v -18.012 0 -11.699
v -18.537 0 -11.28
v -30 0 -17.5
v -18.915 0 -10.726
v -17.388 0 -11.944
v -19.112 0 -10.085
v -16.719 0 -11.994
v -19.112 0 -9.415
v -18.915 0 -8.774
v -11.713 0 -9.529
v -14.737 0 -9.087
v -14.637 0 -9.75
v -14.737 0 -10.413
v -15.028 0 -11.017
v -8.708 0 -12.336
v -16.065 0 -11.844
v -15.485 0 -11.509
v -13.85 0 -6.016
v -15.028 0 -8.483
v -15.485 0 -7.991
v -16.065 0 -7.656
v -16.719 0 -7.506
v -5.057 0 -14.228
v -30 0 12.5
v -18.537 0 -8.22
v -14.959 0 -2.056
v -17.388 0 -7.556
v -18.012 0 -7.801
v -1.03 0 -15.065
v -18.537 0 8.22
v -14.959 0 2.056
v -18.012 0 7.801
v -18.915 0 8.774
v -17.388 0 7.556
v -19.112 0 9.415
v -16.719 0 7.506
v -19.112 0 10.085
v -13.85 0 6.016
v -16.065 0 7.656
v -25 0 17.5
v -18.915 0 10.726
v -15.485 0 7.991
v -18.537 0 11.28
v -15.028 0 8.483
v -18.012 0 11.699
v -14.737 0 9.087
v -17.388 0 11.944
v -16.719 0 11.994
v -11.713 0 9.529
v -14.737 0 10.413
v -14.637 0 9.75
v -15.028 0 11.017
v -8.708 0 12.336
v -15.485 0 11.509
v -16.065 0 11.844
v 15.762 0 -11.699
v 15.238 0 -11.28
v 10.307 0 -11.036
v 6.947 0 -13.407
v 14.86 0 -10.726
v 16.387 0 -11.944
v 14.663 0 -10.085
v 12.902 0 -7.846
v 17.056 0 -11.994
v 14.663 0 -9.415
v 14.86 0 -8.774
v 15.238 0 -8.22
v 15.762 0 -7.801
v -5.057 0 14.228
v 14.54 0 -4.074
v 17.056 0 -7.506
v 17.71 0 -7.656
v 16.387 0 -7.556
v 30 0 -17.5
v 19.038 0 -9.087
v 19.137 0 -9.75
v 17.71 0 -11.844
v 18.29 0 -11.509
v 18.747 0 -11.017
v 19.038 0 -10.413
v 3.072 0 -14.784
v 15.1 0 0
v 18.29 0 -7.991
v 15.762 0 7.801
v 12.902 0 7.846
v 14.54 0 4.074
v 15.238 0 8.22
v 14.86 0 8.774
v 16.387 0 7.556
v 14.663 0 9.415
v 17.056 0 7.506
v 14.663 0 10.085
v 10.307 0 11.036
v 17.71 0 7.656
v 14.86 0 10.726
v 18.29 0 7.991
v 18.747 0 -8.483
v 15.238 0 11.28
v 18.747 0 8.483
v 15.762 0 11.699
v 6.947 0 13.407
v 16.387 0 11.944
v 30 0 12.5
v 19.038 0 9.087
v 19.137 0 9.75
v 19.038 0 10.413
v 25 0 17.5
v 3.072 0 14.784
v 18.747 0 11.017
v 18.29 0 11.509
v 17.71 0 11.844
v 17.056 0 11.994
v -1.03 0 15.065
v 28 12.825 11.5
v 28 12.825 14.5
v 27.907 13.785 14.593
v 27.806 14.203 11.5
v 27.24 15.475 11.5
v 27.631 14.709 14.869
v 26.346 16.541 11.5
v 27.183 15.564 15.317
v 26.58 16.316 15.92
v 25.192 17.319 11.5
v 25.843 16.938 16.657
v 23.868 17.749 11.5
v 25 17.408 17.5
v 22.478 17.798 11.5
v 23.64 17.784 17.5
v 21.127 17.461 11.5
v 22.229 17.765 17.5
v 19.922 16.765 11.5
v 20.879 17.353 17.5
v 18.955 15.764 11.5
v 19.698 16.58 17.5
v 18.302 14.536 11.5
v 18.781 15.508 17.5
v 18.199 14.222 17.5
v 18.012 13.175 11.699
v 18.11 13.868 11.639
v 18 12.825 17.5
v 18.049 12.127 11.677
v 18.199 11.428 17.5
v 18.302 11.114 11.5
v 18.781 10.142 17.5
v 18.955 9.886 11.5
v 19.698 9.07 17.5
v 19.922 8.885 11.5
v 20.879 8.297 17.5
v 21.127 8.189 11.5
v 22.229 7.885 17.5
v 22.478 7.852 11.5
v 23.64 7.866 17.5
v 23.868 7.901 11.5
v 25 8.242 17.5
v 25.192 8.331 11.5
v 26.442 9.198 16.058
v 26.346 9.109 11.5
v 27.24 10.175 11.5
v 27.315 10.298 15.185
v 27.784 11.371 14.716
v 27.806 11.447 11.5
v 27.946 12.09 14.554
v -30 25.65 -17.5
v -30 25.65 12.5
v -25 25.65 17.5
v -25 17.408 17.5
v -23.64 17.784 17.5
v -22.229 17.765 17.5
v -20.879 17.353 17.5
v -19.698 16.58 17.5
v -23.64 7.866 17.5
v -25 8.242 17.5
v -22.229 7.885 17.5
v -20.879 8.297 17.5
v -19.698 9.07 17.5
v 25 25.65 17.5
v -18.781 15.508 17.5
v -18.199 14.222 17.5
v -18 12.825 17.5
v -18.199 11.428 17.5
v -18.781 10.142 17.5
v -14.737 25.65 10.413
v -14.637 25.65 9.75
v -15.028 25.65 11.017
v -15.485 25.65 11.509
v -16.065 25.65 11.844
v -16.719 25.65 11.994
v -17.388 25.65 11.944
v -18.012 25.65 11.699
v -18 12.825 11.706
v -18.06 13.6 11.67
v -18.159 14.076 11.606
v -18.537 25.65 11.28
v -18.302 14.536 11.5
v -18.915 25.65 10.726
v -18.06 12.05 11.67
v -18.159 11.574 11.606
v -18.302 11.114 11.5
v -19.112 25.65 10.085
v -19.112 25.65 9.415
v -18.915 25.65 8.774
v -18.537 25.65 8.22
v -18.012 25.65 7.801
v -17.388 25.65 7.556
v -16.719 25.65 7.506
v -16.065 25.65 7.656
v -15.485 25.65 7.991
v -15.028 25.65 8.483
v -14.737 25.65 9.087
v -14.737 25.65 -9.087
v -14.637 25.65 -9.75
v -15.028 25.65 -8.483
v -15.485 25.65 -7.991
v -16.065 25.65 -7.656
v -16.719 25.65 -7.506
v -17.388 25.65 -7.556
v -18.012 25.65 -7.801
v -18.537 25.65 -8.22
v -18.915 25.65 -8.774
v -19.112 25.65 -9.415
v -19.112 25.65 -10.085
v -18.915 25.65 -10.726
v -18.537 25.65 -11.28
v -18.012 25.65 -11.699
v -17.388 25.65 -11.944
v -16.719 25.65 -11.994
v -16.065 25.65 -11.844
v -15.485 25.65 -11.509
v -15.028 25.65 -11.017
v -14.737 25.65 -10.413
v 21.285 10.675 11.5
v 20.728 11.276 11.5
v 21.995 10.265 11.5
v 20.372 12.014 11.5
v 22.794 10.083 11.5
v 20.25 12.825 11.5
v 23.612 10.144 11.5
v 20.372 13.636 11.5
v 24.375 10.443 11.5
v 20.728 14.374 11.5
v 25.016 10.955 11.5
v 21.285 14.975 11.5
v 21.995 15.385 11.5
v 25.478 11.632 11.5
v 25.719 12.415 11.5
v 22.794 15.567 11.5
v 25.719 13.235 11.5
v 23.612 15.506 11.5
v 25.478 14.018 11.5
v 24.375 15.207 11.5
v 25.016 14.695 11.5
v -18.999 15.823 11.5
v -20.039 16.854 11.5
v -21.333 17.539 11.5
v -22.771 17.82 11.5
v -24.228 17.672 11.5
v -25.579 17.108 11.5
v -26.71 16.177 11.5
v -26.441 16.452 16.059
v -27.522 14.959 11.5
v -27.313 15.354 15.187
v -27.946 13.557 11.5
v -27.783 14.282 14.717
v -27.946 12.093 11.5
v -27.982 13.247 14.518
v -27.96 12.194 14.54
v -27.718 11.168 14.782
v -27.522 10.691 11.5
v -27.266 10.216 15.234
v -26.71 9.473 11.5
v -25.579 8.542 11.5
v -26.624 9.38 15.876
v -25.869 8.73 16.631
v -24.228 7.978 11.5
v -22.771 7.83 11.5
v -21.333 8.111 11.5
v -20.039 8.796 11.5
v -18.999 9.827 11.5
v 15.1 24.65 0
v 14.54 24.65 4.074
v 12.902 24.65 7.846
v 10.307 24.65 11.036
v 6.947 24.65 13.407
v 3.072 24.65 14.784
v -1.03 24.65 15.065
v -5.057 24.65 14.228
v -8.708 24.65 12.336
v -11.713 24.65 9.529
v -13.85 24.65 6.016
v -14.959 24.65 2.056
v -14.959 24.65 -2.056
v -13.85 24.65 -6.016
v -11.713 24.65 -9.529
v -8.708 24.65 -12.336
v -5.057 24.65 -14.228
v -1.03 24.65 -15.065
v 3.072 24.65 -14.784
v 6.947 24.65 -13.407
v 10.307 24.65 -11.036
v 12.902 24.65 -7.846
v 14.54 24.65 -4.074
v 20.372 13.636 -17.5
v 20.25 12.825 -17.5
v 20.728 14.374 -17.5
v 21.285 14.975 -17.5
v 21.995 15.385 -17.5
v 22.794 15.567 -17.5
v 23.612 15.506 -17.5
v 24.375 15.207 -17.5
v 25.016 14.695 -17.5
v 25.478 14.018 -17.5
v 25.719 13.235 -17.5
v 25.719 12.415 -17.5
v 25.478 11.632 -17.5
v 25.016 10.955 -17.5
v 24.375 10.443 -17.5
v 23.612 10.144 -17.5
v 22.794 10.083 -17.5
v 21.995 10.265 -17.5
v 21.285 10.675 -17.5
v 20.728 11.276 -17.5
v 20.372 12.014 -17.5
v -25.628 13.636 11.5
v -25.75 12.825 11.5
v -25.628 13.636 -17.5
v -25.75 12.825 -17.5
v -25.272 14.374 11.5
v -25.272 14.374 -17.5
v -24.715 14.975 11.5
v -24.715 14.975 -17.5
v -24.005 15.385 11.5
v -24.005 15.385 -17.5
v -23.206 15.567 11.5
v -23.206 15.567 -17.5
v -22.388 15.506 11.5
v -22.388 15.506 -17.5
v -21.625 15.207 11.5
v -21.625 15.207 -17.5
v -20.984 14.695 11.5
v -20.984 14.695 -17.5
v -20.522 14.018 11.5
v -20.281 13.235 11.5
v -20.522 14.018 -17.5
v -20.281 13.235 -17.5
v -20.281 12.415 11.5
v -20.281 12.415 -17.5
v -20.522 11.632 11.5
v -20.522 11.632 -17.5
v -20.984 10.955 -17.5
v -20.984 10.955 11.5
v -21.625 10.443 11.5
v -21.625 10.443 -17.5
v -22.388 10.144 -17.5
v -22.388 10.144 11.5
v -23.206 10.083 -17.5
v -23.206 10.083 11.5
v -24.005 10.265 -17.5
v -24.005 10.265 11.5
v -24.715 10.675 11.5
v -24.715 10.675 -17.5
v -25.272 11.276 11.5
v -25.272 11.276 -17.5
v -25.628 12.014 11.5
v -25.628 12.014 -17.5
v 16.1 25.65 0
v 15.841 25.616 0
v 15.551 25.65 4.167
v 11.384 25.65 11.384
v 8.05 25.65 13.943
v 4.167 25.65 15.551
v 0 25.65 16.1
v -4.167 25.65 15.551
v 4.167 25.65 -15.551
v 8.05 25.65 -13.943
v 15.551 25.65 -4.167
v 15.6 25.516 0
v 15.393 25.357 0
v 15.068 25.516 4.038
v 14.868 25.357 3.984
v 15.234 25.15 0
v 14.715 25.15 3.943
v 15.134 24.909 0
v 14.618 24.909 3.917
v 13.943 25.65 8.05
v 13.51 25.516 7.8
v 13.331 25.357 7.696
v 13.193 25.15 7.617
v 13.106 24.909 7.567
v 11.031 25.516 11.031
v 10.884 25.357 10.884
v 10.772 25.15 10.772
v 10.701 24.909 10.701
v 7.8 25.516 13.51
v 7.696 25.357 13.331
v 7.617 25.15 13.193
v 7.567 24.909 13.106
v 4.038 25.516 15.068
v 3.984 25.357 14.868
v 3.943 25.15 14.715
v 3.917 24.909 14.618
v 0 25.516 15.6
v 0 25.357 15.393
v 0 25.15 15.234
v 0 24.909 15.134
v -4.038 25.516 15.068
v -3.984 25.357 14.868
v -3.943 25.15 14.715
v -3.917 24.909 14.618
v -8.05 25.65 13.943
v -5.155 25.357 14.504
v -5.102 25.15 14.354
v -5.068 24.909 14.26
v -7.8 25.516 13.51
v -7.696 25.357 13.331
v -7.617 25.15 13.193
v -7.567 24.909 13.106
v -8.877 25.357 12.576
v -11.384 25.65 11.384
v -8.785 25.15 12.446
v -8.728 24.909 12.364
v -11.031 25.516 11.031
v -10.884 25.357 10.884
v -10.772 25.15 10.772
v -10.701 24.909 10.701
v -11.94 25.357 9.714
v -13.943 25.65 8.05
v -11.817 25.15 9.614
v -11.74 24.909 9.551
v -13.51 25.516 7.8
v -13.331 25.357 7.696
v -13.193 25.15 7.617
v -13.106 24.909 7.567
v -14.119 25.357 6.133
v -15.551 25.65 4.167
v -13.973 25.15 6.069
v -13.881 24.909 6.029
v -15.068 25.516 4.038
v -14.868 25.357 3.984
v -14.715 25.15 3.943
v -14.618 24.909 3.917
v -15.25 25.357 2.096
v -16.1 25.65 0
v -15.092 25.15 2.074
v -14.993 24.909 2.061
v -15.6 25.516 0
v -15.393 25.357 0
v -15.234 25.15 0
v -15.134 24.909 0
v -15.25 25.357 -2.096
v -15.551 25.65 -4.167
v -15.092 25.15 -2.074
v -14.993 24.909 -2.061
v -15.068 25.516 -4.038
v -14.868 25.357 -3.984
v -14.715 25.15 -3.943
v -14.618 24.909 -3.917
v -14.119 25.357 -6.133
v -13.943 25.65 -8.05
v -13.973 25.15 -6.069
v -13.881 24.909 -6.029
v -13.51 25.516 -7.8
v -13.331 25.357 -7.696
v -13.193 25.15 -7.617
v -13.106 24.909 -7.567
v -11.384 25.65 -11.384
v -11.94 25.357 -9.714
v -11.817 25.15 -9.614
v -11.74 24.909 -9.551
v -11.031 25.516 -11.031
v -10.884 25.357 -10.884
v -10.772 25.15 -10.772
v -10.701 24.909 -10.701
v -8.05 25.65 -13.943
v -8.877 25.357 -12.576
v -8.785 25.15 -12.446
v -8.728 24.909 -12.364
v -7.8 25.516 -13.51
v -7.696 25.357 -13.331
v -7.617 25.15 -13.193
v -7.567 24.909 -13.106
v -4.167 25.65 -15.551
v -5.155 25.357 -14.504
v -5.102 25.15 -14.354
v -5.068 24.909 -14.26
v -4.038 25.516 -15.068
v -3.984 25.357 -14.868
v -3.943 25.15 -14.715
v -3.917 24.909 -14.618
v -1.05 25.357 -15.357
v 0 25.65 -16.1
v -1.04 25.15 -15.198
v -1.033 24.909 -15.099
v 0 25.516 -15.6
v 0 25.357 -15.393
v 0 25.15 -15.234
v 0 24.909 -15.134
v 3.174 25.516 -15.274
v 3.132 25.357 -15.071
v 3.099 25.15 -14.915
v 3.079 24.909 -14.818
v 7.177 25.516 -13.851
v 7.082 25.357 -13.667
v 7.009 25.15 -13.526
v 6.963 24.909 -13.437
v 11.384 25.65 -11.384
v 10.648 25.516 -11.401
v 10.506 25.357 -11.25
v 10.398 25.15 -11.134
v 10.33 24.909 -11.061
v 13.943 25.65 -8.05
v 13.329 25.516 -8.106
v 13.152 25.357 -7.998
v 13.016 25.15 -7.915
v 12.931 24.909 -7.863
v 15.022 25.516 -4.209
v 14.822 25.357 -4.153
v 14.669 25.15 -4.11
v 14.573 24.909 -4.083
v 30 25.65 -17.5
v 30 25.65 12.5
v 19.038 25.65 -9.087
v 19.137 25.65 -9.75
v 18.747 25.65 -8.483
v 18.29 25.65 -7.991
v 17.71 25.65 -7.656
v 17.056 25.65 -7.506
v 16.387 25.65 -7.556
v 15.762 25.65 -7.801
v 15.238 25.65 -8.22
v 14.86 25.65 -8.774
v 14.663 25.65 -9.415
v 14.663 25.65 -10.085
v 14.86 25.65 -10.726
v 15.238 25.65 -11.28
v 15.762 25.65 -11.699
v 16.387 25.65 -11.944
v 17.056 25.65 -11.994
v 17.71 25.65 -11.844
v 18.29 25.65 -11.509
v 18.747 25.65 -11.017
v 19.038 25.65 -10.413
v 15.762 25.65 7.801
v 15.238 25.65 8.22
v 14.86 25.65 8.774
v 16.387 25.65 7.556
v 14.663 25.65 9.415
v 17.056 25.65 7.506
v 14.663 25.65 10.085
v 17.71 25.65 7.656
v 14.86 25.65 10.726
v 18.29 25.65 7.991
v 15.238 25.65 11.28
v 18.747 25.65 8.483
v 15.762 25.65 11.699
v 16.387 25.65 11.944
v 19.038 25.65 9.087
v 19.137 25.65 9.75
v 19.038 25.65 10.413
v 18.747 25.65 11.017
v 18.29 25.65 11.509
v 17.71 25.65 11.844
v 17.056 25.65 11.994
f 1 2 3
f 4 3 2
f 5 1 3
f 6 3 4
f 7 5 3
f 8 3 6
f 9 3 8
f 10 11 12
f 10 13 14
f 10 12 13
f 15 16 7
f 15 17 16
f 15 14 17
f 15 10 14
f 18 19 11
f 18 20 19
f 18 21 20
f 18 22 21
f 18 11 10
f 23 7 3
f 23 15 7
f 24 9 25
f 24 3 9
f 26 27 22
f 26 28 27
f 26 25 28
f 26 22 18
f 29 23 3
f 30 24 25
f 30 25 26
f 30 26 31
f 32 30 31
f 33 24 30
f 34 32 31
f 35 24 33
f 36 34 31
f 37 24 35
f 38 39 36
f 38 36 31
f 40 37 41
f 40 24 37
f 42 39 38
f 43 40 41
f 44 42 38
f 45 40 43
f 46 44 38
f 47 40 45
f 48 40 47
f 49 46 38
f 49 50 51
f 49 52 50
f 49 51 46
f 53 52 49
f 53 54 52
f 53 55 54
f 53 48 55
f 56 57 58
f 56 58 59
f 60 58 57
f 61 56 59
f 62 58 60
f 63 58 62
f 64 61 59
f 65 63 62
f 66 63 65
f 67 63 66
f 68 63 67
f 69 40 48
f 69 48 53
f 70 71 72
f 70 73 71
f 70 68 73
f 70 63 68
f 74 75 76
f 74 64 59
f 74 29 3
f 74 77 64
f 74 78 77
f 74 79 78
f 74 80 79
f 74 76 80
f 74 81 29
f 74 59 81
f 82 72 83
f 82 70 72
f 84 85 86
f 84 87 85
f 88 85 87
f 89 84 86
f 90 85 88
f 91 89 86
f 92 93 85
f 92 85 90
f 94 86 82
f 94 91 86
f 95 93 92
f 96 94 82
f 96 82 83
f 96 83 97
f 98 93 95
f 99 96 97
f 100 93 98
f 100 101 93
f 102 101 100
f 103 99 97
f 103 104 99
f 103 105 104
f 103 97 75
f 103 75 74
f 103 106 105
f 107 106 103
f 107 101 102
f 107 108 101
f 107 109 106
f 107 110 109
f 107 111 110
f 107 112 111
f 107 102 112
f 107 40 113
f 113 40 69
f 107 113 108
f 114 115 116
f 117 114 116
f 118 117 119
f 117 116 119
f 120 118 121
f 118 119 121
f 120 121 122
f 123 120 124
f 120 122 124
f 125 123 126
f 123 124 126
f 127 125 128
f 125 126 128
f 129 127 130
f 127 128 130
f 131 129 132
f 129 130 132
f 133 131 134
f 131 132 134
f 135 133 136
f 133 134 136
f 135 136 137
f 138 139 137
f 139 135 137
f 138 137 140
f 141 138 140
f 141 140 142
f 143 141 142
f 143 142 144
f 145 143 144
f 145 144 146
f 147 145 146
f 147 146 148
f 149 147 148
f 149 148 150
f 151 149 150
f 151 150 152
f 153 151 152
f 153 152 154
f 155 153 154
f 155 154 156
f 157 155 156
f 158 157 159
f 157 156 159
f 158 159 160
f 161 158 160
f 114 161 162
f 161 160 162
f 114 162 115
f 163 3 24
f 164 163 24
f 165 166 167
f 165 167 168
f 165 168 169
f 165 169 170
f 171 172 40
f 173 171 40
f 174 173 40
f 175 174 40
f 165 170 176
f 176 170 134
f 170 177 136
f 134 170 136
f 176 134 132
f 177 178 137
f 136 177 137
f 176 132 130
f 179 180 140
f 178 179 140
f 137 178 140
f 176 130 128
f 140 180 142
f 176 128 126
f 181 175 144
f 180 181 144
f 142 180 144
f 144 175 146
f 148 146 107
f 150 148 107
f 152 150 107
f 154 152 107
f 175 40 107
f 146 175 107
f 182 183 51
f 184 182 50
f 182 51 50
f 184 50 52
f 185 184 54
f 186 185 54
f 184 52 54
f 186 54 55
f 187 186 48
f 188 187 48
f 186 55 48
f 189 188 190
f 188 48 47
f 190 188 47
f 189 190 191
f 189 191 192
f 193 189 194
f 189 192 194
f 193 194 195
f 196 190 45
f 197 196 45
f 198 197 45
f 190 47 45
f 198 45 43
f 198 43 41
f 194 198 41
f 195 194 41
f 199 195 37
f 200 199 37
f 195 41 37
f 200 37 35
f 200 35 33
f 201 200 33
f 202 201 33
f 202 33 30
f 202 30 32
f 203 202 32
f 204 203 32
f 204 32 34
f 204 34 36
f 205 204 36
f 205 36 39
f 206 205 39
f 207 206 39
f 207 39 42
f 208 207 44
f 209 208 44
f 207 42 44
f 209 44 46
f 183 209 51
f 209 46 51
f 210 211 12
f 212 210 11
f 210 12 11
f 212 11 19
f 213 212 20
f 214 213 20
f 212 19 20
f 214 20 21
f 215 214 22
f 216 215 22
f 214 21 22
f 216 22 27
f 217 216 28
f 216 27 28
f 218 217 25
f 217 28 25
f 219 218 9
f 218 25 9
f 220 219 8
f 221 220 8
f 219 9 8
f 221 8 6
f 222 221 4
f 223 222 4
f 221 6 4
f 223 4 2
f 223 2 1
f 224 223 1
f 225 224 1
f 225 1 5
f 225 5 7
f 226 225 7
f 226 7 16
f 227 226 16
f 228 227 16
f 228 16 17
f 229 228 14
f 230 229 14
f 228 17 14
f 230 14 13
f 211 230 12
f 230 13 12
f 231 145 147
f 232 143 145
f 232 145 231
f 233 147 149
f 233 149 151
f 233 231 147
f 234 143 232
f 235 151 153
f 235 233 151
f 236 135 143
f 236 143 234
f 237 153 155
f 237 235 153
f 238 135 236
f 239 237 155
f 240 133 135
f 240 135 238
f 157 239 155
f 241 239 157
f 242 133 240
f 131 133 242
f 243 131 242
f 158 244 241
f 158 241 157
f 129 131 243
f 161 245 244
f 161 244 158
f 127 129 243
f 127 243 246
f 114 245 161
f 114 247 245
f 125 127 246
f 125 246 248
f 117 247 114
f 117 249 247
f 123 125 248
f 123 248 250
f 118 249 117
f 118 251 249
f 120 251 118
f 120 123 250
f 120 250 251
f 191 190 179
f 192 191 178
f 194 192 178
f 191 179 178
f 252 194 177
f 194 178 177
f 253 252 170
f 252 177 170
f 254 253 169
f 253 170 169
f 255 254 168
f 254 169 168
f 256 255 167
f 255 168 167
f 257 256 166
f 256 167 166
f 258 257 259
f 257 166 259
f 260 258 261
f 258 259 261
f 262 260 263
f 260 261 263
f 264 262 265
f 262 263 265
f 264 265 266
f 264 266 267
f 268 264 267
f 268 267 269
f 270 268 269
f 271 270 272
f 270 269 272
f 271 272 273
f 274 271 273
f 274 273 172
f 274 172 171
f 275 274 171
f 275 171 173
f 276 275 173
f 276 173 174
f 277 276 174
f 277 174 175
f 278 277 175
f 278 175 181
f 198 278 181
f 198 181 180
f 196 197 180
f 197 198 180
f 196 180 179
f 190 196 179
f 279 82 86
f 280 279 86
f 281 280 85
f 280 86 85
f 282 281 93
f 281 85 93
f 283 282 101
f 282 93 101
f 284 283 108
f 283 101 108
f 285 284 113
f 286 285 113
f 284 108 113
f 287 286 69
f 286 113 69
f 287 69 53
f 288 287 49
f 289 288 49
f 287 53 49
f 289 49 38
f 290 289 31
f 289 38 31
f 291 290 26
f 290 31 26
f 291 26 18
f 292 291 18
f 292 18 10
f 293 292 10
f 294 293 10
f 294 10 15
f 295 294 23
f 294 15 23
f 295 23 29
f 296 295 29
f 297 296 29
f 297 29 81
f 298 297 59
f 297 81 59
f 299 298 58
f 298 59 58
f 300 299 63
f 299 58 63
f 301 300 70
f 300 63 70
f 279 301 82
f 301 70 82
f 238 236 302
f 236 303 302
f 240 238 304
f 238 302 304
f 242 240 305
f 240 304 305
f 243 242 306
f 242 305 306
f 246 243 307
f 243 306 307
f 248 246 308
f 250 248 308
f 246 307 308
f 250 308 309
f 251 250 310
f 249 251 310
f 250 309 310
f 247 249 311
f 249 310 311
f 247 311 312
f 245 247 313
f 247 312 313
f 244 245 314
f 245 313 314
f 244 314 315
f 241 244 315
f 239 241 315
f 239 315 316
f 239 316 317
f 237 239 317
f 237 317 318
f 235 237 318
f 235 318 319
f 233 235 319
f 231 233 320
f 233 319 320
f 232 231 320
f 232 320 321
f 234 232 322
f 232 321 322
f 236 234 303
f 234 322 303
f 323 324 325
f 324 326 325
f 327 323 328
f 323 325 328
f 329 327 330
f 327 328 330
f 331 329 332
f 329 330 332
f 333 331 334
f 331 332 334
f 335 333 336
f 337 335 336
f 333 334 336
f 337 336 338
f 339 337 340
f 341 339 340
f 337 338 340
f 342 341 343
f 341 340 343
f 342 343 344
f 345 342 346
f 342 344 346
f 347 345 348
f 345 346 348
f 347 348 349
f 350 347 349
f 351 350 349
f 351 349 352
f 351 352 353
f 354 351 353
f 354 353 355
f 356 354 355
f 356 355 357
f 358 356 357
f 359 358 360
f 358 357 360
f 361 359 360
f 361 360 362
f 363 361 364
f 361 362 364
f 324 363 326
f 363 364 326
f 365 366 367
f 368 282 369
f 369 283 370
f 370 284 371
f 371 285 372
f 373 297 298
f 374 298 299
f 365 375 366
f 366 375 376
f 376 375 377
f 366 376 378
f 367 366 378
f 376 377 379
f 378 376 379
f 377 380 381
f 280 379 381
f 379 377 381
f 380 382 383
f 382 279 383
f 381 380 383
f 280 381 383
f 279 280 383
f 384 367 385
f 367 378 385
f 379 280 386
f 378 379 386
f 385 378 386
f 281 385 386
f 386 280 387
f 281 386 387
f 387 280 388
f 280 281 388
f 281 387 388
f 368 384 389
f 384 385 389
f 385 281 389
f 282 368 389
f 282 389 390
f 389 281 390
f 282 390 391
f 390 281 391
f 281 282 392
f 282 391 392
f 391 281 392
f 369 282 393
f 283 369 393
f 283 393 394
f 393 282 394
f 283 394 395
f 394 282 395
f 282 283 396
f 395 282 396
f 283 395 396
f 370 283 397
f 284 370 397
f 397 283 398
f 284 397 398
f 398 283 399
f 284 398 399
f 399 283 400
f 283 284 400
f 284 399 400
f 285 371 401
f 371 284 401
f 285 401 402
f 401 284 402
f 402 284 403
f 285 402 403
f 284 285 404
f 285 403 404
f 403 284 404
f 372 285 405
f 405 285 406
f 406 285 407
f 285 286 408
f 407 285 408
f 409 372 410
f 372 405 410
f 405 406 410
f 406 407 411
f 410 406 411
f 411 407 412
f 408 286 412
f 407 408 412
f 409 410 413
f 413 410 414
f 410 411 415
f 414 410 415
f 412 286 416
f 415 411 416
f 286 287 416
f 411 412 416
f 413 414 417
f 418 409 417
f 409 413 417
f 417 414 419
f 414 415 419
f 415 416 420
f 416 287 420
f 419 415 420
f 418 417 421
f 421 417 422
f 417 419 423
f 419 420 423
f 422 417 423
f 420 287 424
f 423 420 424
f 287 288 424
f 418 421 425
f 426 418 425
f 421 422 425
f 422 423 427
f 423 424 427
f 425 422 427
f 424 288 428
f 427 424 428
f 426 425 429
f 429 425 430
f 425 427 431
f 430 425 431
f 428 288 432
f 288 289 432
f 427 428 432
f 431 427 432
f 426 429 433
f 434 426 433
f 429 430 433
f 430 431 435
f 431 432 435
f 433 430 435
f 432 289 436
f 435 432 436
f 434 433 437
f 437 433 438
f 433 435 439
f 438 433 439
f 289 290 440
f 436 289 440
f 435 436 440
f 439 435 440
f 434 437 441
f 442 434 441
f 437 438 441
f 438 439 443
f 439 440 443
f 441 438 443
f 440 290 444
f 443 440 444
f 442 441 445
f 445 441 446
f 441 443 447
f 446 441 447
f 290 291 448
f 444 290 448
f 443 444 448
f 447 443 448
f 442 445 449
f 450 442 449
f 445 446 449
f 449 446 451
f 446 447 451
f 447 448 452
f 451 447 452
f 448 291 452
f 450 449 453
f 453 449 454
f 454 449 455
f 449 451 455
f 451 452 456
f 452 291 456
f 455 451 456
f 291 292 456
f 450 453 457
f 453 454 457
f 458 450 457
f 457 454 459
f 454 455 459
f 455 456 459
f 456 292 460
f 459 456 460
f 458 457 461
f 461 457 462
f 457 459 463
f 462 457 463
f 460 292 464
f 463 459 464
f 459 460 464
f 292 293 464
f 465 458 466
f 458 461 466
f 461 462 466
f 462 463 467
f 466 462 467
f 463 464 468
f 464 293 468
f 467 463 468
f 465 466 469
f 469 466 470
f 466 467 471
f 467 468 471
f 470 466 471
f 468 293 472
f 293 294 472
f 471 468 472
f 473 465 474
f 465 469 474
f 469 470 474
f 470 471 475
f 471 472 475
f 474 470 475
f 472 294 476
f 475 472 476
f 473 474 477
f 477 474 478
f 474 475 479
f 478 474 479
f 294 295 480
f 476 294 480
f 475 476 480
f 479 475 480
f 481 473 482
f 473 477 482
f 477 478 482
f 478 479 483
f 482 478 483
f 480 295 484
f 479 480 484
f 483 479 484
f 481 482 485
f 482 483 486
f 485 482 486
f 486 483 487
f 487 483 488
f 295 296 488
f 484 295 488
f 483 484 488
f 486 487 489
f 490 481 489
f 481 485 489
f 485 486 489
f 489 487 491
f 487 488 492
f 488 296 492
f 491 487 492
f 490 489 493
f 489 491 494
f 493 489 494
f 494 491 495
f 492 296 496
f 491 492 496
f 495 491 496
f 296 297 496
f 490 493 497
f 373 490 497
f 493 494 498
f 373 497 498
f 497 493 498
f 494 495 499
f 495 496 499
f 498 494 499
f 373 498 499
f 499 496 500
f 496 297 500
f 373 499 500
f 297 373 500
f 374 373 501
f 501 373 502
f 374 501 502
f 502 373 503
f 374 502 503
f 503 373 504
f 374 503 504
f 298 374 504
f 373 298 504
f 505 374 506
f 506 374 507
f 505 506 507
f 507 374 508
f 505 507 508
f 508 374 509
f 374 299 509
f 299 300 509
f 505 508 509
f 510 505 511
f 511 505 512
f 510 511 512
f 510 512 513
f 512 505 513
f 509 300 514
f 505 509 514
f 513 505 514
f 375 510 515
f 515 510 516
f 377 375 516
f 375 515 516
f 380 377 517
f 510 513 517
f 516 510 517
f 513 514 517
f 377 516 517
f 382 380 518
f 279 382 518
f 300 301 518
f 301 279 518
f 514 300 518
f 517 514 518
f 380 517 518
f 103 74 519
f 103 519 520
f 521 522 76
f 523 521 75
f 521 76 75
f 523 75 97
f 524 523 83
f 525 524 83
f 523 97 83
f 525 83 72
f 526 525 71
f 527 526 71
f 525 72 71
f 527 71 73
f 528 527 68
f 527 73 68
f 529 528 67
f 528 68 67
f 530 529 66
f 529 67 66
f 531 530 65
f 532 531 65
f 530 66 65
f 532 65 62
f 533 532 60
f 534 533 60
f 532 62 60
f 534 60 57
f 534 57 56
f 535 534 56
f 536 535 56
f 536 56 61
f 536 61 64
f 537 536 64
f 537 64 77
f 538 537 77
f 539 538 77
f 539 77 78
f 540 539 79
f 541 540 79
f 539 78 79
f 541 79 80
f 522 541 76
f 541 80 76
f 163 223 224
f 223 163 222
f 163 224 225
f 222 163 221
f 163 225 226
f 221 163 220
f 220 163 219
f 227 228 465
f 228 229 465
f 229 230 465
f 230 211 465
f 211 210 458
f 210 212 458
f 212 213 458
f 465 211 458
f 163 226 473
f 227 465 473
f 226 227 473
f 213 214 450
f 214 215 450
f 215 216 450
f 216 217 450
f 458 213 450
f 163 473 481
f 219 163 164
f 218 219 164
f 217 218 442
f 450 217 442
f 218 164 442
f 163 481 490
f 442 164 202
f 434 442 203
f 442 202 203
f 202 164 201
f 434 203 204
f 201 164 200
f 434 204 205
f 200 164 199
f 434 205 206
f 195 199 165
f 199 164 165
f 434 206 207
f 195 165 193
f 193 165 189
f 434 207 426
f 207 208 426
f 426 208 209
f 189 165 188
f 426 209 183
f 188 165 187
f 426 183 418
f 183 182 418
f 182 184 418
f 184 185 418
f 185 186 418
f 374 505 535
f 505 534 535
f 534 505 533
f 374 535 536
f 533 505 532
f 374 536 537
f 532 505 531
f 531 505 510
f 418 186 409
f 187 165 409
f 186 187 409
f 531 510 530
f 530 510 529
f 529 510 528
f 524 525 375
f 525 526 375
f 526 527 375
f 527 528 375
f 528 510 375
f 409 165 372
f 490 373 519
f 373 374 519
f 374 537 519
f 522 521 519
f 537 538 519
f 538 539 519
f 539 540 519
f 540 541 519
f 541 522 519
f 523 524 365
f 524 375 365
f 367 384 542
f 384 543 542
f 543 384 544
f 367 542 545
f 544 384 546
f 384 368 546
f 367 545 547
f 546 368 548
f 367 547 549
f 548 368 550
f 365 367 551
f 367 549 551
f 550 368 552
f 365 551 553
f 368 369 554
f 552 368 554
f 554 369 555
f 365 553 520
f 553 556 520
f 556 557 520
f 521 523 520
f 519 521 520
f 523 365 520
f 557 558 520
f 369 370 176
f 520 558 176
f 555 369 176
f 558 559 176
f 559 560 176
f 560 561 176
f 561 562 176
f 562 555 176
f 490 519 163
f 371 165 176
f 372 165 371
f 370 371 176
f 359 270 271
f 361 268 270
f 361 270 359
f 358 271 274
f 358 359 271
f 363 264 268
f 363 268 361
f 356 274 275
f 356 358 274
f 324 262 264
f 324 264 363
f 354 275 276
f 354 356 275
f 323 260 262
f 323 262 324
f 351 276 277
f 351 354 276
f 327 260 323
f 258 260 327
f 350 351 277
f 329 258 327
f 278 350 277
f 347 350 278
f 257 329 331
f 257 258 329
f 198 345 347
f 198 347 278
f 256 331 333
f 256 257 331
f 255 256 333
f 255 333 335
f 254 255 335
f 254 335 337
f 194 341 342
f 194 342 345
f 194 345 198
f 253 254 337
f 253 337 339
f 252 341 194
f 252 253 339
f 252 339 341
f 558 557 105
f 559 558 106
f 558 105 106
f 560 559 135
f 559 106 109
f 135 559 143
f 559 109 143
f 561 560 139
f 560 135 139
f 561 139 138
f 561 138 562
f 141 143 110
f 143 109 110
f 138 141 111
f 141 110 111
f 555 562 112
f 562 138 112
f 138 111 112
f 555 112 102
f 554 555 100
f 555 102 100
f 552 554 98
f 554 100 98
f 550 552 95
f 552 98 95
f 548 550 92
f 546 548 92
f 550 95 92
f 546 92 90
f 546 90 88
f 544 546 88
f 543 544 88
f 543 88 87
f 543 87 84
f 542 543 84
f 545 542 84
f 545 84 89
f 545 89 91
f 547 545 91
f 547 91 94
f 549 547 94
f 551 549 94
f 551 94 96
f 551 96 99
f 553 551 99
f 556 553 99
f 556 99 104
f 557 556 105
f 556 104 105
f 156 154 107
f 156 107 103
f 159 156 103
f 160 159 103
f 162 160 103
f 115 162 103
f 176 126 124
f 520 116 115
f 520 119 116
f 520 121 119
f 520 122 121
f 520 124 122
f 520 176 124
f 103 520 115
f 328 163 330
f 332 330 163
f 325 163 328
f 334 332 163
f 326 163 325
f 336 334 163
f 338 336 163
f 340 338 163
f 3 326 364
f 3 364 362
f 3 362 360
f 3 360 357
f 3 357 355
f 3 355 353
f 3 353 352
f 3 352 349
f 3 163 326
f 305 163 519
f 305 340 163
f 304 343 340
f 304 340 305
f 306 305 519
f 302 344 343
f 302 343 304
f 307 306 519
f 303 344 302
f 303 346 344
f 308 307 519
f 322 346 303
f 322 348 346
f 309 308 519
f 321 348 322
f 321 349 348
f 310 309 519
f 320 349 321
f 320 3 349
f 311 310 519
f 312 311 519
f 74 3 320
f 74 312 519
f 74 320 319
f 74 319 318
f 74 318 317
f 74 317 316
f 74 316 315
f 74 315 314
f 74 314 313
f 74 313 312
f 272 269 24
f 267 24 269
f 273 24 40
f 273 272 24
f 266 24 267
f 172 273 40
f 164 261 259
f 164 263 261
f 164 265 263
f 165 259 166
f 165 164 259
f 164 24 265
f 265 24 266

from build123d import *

# Parameters (mm, degrees)
F0_W           = 60
F0_H           = 35
F0_R           = 2.25
F0_R_2         = 15.1
F1_DEPTH       = 25.65
F3_D           = 5.5
F3_DEPTH       = 35
F3_CBORE_D     = 10
F3_CBORE_DEPTH = 6
F3_TIP         = 1.6523667023
F4_T1_DEPTH    = 51.3668298797
F5_R           = 1


# Not quite as in the source:
# - a fillet or chamfer that OpenCascade refuses, or shapes differently, is made with other operations: its cross-section is extruded or revolved along the edge and cut away or added


with BuildPart() as f1:
    # F0 (on Front) → F1 (new body)
    with BuildSketch(Plane.XZ):
        Rectangle(F0_W, F0_H)
        with Locations((-16.8874953738, -9.75)):
            Circle(F0_R, mode=Mode.SUBTRACT)
        with Locations((16.8874953738, -9.75)):
            Circle(F0_R, mode=Mode.SUBTRACT)
        with Locations((-16.8874953738, 9.75)):
            Circle(F0_R, mode=Mode.SUBTRACT)
        Circle(F0_R_2, mode=Mode.SUBTRACT)
        with Locations((16.8874953738, 9.75)):
            Circle(F0_R, mode=Mode.SUBTRACT)
    extrude(amount=-F1_DEPTH)

    # F3
    with Locations(Plane.XY.offset(17.5)):
        with Locations((-23, 12.825), (23, 12.825)):
            CounterBoreHole(F3_D / 2, F3_CBORE_D / 2, F3_CBORE_DEPTH, depth=F3_DEPTH)
            with Locations((0, 0, -(F3_DEPTH + F3_TIP / 2))):  # 118° drill point
                Cone(0, F3_D / 2, F3_TIP, mode=Mode.SUBTRACT)

    # F4: chamfer of 5 on 2 edges, made by hand

    # F4_s2 → F4_t1 (cut)
    with BuildSketch(Plane.XZ.offset(-38.5084149398)):
        Polygon((25, 17.5), (30, 12.5), (30, 17.5), align=None)
        Polygon((-30, 12.5), (-25, 17.5), (-30, 17.5), align=None)
    extrude(amount=F4_T1_DEPTH, mode=Mode.SUBTRACT)

    # F5
    f5_edges = [f1.edges().sort_by_distance(p)[0] for p in [
        (-15.1, 25.65, 0),
    ]]
    fillet(f5_edges, radius=F5_R)


solid = f1.part
